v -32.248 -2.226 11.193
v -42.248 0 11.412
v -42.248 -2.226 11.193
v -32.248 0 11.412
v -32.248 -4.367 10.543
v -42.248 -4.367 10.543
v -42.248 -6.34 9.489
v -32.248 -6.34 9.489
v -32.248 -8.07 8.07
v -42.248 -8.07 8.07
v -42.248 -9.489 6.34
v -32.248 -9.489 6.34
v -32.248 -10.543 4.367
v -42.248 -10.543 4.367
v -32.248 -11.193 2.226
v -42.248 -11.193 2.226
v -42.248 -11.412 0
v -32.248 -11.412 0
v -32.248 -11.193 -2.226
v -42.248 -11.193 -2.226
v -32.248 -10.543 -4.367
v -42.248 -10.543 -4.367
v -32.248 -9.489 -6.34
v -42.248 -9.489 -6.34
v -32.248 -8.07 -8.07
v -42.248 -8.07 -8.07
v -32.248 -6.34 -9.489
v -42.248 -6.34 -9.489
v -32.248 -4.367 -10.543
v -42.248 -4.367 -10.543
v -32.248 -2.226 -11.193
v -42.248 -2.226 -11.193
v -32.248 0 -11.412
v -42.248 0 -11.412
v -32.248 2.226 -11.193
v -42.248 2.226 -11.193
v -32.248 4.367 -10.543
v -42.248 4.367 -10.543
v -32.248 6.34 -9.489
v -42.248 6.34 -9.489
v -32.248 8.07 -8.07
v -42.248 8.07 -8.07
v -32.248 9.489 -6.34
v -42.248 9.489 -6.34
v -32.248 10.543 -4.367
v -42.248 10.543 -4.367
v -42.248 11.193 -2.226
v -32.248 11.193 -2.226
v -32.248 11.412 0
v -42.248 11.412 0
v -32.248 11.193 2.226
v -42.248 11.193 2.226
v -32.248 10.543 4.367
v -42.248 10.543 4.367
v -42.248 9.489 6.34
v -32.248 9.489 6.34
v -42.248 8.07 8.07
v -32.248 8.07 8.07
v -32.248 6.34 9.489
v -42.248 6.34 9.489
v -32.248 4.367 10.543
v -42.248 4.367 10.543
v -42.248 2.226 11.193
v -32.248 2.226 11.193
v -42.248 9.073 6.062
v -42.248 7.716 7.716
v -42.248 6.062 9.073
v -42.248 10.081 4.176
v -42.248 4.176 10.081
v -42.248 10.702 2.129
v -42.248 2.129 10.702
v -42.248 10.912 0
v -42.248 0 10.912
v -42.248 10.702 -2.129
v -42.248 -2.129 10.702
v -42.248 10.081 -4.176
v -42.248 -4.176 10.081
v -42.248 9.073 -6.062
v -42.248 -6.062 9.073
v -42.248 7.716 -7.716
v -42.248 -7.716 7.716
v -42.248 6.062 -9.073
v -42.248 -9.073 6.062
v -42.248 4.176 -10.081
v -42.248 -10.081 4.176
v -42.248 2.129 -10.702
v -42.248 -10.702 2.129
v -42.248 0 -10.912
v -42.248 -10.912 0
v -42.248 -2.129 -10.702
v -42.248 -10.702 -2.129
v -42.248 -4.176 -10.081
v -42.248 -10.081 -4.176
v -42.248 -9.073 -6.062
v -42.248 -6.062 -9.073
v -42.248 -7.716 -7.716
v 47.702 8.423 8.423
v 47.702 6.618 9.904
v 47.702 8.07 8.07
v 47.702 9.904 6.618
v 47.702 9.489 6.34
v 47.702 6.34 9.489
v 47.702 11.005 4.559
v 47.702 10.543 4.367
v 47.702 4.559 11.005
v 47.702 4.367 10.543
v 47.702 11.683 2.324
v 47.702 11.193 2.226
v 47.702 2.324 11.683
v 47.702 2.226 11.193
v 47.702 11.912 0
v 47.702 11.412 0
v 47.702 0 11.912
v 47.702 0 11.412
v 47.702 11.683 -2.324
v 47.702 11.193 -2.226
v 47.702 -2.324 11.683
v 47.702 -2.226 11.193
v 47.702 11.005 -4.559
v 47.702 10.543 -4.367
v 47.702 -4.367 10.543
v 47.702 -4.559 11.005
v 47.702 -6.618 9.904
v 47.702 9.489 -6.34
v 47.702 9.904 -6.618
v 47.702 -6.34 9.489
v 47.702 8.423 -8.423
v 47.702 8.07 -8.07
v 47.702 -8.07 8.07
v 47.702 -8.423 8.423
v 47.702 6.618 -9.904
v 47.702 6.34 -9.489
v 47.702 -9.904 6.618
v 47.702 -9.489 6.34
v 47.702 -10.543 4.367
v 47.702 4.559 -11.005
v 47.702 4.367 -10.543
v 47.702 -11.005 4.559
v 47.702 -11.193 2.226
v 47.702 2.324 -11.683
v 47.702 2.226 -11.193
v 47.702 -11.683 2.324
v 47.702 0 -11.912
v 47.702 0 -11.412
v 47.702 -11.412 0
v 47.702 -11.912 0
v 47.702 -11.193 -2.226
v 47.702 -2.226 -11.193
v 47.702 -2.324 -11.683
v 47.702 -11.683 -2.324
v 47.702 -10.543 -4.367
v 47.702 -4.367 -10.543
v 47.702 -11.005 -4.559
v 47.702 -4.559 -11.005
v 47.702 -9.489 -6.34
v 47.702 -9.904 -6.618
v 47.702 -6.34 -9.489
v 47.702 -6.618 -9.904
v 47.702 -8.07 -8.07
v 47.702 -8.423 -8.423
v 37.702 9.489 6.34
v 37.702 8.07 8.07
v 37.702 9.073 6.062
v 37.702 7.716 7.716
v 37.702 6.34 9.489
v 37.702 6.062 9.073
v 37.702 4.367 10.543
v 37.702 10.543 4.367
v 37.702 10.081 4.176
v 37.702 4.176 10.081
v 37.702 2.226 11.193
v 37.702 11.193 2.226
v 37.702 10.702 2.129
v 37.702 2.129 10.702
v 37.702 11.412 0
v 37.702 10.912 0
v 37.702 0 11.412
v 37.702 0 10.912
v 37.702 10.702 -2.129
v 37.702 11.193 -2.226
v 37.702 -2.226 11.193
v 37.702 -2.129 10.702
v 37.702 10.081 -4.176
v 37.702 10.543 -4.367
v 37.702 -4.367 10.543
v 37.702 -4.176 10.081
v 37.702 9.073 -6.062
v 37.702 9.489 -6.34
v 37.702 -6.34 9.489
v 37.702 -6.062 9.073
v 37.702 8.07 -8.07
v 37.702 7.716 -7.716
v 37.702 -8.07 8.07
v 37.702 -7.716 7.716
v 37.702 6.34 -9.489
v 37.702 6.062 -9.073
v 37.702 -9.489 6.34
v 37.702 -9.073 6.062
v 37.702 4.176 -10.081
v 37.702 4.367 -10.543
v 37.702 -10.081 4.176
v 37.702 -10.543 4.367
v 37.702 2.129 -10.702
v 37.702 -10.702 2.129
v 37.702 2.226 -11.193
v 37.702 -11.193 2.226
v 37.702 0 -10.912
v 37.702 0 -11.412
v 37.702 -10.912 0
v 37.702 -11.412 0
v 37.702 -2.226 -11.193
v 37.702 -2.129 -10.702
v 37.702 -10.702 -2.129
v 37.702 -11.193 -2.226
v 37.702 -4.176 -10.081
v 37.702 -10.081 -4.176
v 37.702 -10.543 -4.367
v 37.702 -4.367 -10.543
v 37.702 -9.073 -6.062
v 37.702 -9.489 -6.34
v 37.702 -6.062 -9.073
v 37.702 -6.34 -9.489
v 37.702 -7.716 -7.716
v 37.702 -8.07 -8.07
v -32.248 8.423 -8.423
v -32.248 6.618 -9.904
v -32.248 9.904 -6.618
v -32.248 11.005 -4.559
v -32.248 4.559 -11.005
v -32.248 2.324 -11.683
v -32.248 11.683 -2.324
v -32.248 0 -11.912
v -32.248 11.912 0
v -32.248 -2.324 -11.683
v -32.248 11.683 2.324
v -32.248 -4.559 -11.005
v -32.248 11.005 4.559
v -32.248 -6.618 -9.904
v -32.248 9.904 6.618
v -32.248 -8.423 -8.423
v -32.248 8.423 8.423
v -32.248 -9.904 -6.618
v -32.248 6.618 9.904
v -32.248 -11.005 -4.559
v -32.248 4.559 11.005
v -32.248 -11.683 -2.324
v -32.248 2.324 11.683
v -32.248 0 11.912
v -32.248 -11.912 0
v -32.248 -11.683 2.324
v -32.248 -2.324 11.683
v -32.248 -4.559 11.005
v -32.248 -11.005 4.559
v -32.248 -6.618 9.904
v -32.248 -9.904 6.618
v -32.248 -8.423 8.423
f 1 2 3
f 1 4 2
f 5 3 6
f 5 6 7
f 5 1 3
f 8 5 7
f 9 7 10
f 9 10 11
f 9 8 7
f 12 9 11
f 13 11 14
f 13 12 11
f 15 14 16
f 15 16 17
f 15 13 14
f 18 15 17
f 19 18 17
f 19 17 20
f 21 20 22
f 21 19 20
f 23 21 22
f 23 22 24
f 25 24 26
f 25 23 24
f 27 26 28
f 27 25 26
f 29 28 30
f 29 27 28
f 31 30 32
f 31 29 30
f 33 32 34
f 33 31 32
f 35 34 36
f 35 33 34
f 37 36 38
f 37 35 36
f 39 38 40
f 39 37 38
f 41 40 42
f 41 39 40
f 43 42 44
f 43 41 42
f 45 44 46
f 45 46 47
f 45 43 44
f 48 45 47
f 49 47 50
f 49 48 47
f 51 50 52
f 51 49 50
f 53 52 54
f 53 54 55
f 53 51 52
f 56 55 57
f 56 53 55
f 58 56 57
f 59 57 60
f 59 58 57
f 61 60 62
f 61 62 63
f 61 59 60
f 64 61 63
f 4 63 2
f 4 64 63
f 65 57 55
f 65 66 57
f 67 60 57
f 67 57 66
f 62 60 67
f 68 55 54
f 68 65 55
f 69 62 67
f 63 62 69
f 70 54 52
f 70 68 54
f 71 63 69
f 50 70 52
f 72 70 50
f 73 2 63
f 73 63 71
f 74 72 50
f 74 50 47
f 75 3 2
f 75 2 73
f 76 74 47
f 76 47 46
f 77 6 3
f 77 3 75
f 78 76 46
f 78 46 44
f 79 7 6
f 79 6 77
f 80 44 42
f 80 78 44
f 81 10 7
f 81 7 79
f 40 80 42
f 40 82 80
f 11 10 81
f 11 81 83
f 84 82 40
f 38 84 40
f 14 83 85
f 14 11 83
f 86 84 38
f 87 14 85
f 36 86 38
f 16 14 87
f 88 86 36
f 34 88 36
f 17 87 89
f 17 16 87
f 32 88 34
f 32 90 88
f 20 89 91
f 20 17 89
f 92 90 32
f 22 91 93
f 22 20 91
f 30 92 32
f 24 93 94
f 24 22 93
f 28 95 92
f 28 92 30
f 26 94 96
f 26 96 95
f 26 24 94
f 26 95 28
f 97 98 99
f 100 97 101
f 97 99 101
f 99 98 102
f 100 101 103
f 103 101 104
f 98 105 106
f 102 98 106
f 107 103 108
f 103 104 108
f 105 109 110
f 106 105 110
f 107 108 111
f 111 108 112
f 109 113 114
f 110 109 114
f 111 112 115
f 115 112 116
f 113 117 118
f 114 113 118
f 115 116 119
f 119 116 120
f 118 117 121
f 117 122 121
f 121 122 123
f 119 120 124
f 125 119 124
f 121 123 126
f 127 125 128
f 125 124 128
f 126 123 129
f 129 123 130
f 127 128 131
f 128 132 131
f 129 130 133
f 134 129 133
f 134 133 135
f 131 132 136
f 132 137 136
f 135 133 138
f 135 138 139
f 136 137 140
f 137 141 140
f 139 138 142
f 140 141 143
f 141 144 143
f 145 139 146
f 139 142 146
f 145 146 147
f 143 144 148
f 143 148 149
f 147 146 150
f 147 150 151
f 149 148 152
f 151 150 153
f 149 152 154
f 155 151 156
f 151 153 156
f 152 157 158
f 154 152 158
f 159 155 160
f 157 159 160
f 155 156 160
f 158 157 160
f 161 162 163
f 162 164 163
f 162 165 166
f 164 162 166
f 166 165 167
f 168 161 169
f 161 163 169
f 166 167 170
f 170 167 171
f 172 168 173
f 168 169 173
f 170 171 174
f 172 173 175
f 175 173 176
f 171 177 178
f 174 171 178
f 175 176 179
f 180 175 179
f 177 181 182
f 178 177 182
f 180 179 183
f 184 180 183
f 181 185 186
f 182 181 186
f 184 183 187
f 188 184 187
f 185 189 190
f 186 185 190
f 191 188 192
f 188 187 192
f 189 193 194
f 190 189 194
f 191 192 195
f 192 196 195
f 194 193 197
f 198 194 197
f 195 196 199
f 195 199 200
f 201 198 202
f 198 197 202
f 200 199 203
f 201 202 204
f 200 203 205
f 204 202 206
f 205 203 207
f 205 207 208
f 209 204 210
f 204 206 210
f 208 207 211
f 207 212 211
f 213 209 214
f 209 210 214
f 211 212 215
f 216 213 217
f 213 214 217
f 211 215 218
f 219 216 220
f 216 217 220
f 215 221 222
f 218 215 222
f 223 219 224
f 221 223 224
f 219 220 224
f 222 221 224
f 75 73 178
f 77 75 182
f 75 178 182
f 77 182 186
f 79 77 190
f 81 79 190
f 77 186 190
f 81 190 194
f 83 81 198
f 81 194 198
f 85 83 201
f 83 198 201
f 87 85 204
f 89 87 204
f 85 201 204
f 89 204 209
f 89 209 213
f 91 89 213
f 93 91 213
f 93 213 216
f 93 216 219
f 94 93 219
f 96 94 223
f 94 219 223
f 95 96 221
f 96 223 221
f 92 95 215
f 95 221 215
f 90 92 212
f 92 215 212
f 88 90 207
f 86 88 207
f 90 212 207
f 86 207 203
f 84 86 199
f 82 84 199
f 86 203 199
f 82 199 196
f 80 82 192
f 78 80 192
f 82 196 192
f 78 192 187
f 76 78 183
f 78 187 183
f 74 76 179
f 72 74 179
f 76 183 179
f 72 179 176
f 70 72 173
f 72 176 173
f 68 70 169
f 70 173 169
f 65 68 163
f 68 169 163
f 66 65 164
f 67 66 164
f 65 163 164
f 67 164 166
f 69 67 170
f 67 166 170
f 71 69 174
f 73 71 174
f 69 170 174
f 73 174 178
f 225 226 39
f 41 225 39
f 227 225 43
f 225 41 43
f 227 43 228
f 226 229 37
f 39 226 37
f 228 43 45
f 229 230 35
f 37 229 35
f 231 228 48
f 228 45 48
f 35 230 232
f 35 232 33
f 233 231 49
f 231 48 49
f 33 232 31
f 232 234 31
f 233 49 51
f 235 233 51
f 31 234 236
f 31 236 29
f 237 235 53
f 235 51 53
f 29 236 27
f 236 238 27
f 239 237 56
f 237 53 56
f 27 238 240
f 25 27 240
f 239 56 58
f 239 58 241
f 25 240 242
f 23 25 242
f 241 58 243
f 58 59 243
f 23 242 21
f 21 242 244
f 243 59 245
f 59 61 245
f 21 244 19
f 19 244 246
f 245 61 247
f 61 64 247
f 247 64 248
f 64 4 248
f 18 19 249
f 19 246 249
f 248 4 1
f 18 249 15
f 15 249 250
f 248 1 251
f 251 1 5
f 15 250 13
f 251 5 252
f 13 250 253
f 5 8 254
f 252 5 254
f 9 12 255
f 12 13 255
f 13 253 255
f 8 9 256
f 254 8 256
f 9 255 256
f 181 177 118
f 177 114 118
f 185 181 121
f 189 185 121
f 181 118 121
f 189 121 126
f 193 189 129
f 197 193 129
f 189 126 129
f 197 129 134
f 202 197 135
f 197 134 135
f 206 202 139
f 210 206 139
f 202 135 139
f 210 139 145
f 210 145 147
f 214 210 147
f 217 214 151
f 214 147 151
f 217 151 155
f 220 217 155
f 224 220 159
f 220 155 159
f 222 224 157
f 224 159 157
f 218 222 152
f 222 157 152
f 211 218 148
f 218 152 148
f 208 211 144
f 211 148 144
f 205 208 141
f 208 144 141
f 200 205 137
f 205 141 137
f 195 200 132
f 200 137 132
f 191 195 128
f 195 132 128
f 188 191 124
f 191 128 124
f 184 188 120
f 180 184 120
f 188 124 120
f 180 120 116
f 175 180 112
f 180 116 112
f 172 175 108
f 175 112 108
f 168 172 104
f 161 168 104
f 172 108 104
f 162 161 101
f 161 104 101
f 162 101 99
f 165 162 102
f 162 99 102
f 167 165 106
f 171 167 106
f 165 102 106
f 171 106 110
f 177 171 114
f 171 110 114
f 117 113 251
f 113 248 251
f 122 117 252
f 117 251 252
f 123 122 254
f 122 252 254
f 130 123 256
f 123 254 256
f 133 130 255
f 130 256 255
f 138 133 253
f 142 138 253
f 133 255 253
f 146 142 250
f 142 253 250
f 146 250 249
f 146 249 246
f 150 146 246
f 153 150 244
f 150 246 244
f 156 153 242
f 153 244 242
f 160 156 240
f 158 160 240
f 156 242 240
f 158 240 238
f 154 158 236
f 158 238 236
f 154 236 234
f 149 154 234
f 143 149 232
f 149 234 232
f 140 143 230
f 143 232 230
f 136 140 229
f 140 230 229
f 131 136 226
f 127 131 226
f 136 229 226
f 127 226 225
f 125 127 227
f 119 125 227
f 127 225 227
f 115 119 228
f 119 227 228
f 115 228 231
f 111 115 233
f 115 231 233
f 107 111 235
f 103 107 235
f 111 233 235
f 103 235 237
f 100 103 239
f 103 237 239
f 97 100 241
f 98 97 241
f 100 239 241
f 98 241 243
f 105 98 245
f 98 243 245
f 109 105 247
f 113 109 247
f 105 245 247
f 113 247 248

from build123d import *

# Parameters (mm, degrees)
F0_W = 10
F0_H = 0.5


with BuildPart() as f1:
    # F0 (on Front) → F1 (revolve)
    with BuildSketch(Plane.XZ):
        Polygon((0, 11.912), (-32.248389, 11.912), (-32.248389, 11.412), (-32.248389, 10.912), (0, 10.912), align=None)
        Polygon((37.701611, 11.912), (0, 11.912), (0, 10.912), (37.701611, 10.912), (37.701611, 11.412), align=None)
        with Locations((-37.248389, 11.162)):
            Rectangle(F0_W, F0_H)
        with Locations((42.701611, 11.662)):
            Rectangle(F0_W, F0_H)
    revolve(axis=Axis((18.951043, 0, 0), (1, 0, 0)))


solid = f1.part
